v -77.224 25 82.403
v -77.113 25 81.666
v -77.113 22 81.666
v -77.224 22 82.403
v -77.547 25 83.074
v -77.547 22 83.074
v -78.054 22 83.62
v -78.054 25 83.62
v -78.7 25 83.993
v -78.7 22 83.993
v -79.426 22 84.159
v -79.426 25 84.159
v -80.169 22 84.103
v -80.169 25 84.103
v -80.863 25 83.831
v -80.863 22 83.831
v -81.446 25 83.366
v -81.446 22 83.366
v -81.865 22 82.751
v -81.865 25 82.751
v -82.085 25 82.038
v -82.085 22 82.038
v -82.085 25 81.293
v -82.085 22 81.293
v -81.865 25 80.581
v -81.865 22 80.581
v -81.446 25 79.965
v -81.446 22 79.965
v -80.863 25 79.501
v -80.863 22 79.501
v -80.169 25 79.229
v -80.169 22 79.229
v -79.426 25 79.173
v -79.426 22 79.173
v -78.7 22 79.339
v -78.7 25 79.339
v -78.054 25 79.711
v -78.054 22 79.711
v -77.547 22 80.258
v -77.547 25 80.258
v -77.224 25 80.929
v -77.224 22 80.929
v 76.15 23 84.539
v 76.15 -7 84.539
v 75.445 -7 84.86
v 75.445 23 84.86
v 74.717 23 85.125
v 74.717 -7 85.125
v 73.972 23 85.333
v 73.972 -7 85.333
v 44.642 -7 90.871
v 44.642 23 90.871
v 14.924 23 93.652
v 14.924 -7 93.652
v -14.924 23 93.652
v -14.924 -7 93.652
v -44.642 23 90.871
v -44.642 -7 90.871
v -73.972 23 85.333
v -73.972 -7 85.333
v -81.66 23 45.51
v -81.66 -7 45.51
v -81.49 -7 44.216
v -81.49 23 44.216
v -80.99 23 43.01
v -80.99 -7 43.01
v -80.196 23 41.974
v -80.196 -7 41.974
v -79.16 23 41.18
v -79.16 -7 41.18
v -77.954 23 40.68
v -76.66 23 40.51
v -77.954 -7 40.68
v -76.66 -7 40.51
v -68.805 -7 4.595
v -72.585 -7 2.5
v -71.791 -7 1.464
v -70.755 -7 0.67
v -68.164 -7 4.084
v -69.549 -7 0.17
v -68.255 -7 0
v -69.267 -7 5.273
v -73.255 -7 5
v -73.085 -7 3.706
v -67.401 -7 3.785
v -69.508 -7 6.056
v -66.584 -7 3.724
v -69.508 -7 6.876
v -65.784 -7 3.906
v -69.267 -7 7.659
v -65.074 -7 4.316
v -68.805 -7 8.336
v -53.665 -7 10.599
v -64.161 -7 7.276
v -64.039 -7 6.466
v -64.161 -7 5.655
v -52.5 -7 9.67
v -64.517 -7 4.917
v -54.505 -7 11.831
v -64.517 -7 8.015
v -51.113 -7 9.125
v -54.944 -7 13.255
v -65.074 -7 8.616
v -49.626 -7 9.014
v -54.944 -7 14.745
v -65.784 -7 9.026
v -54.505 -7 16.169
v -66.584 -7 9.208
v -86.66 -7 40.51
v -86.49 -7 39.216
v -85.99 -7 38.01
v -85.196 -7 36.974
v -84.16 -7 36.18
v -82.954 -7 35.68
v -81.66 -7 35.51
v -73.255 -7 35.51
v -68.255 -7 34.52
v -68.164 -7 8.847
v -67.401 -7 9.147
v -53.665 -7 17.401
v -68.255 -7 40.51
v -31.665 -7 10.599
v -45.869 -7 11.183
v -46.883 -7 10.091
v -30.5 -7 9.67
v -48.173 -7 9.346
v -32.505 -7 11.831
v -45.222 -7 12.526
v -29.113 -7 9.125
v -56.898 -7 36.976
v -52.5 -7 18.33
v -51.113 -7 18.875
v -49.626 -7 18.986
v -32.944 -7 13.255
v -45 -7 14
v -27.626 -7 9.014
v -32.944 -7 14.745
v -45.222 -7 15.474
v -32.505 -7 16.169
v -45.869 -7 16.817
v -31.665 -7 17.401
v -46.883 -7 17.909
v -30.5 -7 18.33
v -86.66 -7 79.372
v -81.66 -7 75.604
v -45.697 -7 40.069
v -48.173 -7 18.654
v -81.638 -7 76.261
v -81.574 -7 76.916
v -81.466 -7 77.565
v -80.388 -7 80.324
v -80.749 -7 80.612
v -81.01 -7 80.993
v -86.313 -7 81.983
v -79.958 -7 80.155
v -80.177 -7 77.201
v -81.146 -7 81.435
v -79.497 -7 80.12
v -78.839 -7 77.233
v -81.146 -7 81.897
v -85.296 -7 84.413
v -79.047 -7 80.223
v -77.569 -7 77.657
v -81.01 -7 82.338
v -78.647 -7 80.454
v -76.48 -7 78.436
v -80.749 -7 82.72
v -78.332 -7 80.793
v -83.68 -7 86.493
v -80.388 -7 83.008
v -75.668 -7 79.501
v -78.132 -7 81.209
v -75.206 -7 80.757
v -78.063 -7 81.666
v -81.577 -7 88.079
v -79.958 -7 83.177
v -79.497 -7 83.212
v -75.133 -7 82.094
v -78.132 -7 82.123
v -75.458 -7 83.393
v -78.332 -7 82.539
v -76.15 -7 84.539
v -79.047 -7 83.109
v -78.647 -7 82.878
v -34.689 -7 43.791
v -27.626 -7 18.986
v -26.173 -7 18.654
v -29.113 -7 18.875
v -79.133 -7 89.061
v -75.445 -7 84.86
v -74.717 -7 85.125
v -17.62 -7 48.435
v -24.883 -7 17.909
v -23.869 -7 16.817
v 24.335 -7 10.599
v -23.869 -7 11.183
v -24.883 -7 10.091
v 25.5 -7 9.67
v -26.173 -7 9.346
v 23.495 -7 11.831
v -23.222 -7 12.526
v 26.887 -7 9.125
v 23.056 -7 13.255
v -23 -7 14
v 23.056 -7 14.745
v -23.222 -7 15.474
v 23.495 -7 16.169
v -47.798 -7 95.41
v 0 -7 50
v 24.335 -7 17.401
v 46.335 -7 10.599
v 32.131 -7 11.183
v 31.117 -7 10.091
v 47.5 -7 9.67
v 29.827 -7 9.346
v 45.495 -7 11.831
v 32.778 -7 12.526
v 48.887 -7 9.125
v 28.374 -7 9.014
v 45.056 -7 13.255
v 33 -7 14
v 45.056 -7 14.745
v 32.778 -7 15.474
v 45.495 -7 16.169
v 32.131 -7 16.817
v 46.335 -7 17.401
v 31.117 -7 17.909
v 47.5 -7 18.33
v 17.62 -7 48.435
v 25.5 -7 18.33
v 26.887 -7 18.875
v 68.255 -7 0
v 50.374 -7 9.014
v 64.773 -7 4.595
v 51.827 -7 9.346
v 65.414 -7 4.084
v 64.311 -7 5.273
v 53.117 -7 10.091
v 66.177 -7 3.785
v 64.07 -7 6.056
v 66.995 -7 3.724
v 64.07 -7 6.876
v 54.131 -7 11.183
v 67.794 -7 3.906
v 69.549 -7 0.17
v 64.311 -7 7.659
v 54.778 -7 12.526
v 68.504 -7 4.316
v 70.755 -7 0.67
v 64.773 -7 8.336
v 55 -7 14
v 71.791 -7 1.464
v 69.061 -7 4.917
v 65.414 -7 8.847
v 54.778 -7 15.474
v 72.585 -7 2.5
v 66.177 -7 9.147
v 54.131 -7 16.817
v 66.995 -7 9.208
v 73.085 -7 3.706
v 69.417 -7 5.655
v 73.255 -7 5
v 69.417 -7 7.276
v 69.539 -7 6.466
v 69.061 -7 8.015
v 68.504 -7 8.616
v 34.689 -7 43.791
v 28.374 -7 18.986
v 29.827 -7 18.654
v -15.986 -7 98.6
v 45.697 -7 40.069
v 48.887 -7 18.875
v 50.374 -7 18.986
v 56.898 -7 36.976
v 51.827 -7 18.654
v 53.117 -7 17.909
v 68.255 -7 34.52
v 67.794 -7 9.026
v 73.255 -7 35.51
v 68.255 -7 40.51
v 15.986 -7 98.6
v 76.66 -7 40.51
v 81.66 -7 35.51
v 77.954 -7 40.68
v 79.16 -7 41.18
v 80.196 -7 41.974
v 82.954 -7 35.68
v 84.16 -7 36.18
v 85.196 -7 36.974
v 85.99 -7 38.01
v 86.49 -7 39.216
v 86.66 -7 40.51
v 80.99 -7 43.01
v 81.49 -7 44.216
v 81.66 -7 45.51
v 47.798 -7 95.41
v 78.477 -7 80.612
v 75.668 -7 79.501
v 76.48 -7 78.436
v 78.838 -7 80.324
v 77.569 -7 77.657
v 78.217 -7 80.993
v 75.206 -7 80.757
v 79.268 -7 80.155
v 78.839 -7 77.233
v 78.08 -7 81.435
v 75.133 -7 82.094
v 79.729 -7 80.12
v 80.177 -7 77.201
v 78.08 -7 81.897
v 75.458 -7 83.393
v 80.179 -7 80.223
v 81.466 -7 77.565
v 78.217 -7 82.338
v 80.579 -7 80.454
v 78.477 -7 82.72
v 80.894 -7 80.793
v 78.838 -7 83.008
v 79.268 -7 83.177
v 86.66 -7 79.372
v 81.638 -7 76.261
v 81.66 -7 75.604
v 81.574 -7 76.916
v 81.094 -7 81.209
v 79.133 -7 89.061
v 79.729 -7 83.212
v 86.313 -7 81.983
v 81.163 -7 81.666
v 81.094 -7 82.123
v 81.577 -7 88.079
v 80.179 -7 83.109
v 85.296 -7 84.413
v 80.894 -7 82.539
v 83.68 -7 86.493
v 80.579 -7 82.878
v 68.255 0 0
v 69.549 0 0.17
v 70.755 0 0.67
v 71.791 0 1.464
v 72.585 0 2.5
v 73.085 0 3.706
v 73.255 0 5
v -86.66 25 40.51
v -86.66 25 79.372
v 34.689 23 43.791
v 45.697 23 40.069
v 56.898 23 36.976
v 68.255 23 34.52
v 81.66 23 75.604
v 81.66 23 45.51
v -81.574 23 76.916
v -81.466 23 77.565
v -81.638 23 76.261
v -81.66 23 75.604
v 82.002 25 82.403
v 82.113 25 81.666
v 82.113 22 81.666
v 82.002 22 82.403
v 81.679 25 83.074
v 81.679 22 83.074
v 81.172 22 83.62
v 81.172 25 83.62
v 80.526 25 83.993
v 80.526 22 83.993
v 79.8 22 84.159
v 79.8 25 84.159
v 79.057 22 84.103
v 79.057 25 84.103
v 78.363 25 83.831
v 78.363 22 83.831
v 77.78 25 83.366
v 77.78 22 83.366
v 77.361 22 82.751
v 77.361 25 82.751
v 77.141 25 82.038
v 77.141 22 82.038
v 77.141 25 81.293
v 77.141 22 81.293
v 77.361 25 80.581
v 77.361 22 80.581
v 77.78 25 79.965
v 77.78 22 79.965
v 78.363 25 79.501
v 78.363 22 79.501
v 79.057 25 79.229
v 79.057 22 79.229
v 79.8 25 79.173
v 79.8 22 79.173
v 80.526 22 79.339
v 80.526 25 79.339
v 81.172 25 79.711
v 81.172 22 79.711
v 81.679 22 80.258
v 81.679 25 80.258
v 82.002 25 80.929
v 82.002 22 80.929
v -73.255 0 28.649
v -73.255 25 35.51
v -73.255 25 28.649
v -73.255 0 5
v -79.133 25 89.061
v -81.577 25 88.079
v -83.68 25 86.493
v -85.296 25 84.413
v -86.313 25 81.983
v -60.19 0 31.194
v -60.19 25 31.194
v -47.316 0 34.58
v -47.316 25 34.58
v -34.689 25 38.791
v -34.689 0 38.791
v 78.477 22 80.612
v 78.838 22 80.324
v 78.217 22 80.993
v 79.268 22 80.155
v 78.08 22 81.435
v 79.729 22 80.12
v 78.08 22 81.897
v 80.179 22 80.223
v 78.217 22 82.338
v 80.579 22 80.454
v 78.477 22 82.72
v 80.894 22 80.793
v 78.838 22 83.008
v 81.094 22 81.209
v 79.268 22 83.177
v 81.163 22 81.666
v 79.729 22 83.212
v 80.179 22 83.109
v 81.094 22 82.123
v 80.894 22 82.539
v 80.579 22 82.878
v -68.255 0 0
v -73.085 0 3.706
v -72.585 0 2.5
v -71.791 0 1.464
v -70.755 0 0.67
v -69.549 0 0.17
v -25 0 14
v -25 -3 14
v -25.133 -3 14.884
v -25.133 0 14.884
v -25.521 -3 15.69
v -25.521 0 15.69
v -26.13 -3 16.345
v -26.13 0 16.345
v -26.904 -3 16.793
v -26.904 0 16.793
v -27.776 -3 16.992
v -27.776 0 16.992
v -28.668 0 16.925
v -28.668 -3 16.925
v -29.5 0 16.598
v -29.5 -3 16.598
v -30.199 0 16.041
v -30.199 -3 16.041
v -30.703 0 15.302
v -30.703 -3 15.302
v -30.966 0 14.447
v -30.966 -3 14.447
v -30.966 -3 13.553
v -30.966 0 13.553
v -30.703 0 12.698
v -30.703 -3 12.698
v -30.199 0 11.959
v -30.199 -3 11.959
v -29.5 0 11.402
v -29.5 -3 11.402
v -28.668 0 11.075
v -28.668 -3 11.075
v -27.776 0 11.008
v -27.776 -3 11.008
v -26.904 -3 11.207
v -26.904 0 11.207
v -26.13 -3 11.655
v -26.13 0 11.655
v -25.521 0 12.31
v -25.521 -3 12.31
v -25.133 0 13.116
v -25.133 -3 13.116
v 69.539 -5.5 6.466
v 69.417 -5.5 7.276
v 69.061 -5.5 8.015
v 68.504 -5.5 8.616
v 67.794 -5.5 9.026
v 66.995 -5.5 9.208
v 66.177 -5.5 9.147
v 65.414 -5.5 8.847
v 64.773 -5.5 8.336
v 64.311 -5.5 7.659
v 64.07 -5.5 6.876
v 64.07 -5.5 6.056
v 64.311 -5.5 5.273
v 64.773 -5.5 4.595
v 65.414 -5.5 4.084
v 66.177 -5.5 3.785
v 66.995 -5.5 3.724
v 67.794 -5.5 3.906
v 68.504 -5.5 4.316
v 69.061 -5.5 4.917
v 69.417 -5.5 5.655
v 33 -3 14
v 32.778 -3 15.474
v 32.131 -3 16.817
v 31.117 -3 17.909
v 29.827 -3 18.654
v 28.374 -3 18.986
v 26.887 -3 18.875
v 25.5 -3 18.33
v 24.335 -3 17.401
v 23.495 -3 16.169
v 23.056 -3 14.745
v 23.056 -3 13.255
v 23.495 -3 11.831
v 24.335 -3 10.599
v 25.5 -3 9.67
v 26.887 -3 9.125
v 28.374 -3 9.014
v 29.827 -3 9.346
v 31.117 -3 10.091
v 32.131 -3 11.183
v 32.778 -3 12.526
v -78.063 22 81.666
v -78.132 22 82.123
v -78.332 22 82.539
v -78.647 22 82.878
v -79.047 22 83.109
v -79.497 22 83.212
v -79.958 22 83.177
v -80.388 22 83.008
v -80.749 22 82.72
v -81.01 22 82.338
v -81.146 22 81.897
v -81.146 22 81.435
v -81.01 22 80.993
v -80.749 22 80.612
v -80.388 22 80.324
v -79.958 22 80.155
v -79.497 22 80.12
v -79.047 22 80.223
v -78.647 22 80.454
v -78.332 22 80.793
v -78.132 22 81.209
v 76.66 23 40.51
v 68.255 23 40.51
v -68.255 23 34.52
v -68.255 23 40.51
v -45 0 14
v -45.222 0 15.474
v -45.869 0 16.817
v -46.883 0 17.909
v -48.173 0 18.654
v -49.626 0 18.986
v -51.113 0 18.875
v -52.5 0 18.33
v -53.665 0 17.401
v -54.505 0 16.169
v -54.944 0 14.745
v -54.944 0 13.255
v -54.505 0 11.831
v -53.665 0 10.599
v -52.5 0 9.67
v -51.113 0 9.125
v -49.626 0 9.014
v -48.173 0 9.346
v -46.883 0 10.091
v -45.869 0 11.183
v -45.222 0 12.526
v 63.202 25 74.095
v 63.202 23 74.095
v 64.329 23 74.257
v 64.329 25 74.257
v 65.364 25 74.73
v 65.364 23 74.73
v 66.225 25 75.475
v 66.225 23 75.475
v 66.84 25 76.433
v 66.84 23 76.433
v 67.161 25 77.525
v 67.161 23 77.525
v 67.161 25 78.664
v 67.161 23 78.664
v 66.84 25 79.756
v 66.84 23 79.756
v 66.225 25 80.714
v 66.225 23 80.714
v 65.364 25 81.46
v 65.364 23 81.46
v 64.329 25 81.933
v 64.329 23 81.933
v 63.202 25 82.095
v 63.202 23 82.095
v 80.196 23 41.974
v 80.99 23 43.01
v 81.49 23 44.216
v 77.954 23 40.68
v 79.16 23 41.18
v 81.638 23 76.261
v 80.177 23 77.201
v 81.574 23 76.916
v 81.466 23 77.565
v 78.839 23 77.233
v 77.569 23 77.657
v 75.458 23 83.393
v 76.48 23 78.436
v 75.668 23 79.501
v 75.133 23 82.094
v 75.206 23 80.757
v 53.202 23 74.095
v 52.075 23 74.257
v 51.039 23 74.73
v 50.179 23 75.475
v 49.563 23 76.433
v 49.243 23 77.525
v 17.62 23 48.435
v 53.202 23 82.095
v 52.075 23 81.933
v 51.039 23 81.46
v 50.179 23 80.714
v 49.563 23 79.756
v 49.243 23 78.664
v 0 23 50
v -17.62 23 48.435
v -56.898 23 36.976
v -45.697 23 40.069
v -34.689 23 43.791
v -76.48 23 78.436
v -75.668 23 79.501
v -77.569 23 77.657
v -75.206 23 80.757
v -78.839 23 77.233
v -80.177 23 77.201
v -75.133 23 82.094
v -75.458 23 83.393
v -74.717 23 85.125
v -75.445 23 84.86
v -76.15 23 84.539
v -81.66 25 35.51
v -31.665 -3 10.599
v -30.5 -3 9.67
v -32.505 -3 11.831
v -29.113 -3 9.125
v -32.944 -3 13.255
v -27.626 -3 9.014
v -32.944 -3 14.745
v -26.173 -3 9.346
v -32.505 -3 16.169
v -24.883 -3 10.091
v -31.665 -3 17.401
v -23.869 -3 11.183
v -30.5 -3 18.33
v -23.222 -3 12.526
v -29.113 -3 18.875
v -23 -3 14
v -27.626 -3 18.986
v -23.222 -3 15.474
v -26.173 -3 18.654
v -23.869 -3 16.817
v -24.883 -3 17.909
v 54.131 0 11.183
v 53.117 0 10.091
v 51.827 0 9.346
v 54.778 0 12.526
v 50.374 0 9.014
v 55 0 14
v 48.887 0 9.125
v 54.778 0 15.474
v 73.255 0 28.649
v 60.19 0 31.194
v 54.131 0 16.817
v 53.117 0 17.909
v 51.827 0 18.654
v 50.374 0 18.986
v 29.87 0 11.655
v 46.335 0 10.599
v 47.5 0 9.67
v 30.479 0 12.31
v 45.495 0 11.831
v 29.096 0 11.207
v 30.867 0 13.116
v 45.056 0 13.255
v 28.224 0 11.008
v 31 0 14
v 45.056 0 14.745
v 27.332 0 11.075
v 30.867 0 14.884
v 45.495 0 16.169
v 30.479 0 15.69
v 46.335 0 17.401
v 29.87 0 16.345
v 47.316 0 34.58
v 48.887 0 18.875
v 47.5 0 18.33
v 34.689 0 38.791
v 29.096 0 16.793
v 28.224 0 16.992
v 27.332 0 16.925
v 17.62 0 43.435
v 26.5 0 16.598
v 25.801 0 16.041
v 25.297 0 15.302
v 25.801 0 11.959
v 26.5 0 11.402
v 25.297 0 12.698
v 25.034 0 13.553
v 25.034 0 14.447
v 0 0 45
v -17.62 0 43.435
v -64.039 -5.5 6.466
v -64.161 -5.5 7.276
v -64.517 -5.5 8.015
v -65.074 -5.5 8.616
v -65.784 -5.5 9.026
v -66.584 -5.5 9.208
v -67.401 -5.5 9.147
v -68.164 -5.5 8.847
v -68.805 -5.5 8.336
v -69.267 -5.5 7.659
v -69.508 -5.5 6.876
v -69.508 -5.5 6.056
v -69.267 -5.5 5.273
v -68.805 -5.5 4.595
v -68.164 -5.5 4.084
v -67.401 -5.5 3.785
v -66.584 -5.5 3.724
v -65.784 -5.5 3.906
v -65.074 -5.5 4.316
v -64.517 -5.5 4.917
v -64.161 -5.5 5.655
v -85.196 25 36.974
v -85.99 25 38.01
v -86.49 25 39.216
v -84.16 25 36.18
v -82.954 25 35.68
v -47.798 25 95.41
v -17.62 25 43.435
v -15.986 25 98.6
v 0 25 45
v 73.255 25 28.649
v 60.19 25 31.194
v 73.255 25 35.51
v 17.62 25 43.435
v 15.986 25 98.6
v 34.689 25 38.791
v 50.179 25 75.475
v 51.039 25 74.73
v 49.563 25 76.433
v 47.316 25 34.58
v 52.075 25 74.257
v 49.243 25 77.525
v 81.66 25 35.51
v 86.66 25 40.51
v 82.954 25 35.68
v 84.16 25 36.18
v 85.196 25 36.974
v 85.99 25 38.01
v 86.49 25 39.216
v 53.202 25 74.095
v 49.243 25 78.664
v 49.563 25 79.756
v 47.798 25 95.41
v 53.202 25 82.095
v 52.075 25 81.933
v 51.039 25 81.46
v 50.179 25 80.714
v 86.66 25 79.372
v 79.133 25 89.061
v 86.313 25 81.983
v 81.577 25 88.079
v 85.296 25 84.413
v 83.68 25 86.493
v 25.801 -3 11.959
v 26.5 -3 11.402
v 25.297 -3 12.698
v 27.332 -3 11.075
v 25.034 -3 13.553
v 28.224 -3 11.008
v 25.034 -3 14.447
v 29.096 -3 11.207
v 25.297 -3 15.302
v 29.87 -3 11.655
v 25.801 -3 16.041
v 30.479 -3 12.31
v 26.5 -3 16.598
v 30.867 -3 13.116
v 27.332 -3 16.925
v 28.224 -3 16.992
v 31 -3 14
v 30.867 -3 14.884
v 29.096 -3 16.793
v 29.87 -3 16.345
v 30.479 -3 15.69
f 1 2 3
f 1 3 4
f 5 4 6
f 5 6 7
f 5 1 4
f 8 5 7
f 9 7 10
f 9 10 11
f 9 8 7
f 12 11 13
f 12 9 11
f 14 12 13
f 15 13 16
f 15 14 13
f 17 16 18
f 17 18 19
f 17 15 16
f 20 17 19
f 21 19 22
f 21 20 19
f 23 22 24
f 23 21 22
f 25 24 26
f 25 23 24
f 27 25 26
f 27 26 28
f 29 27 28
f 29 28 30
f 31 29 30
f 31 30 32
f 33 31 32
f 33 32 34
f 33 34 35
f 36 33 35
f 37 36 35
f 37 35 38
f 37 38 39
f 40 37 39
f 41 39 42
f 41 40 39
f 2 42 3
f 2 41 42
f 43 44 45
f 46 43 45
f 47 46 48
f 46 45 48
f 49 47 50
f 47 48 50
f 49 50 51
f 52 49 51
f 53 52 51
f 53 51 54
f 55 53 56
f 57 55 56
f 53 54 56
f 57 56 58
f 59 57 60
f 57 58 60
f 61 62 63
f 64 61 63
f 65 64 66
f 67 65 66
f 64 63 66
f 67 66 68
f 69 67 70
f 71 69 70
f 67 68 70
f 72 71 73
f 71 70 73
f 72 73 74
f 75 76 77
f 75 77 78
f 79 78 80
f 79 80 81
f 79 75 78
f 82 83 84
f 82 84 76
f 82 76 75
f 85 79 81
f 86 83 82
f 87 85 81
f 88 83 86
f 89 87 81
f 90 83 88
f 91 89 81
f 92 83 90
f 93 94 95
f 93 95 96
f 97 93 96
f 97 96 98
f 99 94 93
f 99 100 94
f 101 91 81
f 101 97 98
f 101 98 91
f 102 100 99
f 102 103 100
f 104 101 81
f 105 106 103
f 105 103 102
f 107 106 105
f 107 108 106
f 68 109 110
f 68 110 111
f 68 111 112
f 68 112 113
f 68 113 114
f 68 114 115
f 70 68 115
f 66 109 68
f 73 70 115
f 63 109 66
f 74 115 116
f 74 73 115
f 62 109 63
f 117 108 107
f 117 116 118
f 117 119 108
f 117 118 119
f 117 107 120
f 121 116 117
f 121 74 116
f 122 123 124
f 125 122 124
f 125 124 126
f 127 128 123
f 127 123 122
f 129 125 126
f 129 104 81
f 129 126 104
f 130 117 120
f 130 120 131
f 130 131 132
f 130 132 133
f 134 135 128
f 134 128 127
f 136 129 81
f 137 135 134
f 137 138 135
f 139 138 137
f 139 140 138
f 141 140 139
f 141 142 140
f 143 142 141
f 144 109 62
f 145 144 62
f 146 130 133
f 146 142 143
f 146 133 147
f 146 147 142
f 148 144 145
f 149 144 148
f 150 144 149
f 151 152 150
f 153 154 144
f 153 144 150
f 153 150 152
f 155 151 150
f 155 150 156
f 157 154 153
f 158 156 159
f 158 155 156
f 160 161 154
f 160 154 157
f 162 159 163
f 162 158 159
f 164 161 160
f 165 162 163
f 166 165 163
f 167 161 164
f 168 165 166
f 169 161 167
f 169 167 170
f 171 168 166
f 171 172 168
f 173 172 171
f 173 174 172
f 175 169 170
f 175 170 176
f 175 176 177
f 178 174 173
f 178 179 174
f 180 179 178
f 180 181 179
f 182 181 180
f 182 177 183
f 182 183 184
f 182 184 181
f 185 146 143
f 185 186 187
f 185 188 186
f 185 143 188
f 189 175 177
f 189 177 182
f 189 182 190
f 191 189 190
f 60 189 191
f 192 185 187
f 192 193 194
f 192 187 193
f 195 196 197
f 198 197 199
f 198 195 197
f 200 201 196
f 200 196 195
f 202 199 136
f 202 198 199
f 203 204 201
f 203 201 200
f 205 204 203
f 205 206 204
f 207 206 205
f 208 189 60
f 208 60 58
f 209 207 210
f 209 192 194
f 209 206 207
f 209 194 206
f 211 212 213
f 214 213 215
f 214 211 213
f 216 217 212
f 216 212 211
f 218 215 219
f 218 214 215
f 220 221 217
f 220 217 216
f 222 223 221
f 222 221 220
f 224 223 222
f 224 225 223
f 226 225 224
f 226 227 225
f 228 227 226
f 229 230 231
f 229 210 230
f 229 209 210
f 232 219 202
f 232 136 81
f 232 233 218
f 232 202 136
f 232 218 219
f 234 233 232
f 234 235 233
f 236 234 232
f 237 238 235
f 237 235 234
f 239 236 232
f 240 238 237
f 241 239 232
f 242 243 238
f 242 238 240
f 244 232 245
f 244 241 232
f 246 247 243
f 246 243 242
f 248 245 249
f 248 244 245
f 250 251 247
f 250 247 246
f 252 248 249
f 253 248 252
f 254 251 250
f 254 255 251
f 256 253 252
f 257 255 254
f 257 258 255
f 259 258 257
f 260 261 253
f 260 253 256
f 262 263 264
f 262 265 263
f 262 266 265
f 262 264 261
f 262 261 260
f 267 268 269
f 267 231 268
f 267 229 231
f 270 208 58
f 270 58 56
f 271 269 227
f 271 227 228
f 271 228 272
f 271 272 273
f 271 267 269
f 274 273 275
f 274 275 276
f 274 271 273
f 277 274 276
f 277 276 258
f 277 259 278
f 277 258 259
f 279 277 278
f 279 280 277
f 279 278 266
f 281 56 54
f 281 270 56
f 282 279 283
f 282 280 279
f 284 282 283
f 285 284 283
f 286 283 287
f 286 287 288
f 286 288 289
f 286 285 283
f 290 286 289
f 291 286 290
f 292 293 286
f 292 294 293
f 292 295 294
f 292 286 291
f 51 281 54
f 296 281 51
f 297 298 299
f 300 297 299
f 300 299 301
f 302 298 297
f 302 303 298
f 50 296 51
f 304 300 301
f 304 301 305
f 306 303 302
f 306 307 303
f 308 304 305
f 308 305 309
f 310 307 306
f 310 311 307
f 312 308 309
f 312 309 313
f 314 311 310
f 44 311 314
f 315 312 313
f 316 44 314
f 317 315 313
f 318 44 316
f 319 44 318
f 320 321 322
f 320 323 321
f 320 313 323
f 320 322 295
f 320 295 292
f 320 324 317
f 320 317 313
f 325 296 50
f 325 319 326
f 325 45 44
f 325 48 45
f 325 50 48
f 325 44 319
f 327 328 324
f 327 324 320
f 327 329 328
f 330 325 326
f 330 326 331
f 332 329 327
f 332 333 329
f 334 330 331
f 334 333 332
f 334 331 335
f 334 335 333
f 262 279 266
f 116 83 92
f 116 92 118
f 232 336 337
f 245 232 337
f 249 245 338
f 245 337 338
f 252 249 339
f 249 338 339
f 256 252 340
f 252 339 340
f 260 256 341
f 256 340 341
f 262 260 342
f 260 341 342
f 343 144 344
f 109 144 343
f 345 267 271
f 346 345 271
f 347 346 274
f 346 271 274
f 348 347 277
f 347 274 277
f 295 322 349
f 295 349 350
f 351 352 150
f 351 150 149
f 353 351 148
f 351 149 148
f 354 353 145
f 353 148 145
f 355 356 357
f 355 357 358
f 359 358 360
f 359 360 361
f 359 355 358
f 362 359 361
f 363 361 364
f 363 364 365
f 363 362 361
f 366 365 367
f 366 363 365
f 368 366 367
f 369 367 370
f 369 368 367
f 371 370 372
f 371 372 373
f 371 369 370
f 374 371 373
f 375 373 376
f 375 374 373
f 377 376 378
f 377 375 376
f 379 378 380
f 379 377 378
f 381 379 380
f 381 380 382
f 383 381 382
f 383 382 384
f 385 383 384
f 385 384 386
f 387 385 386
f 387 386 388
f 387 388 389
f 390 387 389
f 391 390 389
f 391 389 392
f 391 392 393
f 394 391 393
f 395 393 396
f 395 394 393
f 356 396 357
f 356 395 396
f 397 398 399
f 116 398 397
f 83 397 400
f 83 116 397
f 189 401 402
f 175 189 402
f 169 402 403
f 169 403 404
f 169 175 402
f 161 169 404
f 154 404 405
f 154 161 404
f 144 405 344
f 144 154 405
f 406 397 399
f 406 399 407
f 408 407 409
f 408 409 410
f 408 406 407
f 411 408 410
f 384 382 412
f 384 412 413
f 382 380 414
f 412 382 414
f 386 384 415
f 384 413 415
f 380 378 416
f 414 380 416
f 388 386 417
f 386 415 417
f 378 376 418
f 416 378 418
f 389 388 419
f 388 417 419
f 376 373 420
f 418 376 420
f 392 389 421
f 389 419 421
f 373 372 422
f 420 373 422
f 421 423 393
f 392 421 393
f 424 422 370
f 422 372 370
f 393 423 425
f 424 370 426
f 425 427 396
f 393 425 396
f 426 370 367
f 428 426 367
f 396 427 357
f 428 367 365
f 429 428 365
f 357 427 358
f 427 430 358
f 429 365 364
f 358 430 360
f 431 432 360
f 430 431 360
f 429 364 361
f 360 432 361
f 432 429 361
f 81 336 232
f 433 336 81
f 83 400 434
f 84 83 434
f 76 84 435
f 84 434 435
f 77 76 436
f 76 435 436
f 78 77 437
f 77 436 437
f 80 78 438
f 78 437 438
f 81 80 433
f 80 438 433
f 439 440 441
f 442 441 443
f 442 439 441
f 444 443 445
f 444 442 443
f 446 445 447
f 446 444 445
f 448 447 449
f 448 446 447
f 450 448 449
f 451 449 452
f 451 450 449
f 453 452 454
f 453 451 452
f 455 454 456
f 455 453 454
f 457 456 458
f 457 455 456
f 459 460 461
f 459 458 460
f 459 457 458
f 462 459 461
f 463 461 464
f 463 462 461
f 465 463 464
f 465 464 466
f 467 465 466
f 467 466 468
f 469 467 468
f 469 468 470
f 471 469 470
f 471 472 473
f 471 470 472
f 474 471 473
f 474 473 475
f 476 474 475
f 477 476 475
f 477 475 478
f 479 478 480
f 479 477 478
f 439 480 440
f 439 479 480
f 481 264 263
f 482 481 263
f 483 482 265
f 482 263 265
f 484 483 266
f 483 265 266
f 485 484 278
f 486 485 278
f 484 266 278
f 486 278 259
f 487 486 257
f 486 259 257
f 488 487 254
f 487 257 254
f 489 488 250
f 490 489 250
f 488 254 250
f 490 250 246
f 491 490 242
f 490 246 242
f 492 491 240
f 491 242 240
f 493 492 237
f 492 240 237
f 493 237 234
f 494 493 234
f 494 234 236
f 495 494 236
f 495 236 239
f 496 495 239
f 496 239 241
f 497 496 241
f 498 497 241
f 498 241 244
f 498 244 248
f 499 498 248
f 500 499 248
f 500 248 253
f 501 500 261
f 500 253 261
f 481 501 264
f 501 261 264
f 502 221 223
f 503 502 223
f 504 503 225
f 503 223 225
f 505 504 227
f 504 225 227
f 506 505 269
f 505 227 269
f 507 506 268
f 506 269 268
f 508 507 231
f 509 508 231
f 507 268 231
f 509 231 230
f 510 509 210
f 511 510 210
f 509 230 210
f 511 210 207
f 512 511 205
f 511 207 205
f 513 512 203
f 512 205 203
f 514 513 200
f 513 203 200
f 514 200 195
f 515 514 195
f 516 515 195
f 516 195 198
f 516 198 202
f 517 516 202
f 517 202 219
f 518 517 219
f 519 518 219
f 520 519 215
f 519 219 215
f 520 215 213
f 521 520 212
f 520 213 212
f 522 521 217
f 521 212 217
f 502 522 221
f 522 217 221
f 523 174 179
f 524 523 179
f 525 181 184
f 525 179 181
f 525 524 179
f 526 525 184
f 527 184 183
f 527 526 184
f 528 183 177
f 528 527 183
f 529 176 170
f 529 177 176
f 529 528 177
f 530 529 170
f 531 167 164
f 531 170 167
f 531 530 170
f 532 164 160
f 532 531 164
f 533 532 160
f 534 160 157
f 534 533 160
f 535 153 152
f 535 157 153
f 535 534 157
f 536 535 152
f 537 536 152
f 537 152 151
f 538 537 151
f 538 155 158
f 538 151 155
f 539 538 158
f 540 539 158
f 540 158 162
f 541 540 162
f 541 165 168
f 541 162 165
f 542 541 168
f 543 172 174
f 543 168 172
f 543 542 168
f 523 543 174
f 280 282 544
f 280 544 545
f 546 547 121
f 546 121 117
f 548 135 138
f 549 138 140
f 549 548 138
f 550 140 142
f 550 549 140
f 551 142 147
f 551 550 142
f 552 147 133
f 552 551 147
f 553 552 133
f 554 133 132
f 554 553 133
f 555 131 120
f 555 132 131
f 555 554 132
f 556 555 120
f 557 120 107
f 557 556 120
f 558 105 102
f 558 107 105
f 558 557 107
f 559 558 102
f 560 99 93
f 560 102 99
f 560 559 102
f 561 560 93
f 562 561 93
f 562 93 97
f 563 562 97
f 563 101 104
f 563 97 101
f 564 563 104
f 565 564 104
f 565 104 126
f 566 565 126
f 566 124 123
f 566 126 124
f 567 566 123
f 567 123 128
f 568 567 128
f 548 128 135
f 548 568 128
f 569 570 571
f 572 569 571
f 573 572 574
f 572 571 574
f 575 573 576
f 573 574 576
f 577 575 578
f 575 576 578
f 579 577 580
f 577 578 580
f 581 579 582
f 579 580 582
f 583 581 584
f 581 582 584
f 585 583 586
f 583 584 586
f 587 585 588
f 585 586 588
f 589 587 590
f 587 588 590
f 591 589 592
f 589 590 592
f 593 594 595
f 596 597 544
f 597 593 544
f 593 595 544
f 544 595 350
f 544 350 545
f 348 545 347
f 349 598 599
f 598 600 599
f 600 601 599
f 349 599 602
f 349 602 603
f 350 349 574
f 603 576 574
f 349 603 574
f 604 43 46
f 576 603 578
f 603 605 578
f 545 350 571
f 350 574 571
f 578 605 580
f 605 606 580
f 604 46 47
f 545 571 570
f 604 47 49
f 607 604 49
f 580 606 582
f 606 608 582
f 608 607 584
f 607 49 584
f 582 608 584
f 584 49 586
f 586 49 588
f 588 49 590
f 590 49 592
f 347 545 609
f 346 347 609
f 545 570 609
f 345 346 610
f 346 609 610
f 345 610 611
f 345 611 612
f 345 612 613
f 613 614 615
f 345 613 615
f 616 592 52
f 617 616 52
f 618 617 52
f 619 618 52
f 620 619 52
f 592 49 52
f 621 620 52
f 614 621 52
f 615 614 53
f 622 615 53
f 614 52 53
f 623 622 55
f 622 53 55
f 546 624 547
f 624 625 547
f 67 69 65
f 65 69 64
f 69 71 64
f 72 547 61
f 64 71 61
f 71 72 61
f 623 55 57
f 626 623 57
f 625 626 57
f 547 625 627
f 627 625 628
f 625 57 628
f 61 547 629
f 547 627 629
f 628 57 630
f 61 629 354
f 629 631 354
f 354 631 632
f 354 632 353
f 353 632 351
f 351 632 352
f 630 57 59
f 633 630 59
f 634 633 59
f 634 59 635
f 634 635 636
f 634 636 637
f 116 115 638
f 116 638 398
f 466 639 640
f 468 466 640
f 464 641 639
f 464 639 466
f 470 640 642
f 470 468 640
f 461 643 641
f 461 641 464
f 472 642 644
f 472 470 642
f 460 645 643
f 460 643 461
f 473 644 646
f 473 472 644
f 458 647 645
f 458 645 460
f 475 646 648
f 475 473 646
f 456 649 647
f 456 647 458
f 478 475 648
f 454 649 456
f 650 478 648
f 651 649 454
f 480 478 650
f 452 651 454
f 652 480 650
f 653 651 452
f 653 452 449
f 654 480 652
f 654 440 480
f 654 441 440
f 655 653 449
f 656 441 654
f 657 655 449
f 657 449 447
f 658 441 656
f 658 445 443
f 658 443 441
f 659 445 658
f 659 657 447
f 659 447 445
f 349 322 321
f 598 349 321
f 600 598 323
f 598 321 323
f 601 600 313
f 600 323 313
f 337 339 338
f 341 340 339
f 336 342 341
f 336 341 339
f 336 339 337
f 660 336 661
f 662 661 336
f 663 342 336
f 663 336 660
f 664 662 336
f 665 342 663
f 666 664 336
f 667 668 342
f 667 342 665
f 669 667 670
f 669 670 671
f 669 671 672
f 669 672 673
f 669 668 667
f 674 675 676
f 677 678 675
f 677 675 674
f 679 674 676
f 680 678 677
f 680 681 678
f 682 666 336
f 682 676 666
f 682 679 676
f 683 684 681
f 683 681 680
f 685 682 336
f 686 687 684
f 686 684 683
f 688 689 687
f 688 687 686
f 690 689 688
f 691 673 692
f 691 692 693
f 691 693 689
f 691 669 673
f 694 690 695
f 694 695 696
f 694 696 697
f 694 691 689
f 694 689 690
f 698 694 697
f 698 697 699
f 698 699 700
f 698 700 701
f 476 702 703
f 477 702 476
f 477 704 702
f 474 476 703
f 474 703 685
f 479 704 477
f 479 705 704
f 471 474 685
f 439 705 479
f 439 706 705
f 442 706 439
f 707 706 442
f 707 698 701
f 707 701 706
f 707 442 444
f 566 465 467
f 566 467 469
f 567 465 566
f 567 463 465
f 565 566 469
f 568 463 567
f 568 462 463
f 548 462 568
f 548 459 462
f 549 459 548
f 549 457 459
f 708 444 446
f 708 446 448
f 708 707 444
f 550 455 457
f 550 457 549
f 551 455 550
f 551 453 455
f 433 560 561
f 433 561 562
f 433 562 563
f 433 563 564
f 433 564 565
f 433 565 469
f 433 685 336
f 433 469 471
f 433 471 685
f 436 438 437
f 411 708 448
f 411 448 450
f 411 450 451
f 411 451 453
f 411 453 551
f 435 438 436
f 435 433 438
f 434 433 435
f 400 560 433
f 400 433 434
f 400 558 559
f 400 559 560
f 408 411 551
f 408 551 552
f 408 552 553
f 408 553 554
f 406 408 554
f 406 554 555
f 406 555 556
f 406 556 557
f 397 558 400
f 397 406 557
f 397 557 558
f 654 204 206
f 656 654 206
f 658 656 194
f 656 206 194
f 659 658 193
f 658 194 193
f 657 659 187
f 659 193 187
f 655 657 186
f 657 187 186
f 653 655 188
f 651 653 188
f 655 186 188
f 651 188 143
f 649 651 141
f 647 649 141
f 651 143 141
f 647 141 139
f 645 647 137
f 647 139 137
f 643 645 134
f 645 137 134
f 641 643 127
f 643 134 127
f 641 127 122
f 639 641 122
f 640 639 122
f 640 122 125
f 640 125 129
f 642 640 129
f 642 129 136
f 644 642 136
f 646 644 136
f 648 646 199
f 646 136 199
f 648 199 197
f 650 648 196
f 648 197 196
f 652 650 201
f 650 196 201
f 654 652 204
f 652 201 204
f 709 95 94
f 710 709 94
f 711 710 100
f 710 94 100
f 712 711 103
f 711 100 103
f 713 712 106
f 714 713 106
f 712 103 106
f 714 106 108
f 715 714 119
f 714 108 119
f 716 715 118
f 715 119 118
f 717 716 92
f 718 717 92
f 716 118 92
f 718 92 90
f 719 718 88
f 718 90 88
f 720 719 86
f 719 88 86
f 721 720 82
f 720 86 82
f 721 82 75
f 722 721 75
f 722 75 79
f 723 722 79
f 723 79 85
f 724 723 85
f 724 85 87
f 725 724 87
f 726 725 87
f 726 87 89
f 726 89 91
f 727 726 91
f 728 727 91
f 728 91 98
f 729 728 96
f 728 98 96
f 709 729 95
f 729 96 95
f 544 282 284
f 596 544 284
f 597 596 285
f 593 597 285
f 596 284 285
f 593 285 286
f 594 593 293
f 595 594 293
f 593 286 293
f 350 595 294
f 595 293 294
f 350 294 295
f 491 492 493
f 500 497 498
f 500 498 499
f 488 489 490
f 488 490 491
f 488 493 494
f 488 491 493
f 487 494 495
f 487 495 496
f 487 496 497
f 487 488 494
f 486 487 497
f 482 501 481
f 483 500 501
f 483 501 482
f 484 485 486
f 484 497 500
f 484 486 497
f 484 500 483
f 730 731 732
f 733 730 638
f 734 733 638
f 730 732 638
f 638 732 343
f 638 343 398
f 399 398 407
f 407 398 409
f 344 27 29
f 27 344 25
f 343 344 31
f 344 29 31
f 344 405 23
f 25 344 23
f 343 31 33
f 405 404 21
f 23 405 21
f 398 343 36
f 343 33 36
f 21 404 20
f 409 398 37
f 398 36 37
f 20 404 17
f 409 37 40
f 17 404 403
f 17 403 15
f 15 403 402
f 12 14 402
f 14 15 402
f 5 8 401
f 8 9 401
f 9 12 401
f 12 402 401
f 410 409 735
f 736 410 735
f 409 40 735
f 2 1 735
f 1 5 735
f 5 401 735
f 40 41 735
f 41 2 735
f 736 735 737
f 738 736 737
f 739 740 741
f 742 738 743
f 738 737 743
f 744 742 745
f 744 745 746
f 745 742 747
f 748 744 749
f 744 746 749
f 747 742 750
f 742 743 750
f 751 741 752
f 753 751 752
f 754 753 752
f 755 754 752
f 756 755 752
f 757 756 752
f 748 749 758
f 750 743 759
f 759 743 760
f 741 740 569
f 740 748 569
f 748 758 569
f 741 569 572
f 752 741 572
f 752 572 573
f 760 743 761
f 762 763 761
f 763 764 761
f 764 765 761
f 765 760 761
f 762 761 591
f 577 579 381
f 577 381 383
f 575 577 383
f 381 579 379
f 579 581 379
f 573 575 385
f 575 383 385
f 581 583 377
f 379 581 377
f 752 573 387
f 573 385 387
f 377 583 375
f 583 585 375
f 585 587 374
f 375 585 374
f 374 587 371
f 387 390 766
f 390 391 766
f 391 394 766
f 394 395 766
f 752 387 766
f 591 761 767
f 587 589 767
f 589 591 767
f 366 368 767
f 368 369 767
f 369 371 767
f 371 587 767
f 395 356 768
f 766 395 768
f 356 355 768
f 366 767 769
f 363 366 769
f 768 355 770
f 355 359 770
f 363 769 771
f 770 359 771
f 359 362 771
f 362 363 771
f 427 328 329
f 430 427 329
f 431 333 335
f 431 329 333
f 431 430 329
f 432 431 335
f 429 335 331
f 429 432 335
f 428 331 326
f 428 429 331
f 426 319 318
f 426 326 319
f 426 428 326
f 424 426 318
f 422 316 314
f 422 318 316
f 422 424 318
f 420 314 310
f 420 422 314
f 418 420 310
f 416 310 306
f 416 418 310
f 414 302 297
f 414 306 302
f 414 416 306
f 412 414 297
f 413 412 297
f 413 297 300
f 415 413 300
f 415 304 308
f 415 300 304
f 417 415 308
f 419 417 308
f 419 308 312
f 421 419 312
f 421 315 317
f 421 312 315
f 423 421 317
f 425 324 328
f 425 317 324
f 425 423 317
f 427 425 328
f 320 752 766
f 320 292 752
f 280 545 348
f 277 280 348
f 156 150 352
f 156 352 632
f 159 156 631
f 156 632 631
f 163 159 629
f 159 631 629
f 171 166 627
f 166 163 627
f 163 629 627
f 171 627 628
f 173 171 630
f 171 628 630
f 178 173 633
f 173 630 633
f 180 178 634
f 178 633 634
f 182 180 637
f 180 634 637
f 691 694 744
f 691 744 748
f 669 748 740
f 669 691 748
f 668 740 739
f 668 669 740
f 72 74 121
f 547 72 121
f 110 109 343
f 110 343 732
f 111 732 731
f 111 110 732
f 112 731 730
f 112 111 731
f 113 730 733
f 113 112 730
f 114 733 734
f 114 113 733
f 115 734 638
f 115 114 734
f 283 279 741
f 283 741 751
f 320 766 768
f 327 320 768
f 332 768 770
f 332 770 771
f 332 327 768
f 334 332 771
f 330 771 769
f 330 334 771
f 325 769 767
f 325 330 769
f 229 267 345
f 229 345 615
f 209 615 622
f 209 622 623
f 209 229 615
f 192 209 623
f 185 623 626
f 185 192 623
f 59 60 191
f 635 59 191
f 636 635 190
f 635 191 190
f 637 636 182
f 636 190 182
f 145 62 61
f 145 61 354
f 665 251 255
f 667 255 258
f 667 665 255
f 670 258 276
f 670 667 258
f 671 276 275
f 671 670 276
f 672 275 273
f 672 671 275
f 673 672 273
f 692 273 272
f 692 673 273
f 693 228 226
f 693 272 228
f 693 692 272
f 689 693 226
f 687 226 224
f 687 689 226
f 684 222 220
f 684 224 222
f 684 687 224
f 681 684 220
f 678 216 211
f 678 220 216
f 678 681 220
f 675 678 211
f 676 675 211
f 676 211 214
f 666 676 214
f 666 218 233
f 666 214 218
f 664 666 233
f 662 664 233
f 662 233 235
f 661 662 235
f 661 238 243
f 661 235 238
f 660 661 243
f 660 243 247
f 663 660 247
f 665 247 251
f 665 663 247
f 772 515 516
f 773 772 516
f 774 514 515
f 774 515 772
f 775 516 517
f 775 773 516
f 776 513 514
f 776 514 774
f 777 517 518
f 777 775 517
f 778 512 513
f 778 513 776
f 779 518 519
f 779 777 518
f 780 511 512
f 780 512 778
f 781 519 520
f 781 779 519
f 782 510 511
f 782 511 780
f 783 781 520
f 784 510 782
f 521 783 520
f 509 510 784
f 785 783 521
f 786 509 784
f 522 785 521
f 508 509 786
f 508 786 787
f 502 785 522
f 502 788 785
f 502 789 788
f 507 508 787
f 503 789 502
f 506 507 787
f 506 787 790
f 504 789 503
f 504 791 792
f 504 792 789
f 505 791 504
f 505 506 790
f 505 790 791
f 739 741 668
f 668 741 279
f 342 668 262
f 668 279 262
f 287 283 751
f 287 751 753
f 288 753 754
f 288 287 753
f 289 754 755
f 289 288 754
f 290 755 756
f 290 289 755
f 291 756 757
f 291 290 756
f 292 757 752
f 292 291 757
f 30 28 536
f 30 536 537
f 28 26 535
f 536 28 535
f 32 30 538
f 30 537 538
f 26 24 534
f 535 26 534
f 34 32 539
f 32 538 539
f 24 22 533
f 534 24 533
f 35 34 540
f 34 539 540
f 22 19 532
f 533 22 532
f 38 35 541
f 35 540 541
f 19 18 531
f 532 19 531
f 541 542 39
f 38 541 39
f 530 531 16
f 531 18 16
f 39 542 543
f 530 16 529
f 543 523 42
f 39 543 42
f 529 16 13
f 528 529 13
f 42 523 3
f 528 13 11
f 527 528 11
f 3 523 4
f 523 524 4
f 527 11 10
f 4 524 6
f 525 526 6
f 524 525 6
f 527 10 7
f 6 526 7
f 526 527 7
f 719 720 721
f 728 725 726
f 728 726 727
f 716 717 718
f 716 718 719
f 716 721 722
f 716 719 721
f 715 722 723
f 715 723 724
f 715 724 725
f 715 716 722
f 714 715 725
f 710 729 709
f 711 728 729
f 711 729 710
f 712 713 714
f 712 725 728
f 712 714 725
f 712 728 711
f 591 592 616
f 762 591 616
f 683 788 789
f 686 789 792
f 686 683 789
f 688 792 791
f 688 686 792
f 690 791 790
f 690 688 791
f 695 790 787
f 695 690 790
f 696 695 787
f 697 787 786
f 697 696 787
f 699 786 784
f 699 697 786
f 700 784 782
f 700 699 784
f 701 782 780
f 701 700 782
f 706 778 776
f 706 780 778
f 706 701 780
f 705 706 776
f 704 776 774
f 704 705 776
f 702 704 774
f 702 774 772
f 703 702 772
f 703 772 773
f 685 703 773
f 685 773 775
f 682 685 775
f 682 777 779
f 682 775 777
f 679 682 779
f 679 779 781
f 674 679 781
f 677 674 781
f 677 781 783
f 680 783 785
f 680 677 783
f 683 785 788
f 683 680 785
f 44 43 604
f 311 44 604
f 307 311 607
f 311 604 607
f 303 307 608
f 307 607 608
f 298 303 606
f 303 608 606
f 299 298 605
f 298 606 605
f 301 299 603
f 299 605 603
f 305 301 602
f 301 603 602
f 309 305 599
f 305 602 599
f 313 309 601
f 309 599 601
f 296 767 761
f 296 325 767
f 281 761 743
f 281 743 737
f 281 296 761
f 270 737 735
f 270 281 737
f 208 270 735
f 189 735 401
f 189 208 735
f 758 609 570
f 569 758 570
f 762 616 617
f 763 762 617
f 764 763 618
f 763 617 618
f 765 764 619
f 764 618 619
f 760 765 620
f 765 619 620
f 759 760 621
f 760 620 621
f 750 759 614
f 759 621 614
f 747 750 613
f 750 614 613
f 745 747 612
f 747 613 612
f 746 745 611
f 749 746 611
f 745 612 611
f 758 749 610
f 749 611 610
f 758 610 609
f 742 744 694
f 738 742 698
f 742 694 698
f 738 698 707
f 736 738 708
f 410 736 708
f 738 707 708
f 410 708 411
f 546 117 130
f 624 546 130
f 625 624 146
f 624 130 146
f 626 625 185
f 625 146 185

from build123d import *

# Parameters (mm, degrees)
PAD_DEPTH       = 7
PAD012_DEPTH    = 25
SKETCH013_R     = 5
SKETCH013_R_2   = 3
POCKET007_DEPTH = 7.001
POCKET008_DEPTH = 30
SKETCH023_R     = 5
POCKET009_DEPTH = 4
SKETCH024_R     = 4.5
PAD013_DEPTH    = 30
SKETCH028_R     = 2.75
POCKET012_DEPTH = 1.5
SKETCH029_R     = 1.55
POCKET013_DEPTH = 32.001
SKETCH030_R     = 2.5
POCKET014_DEPTH = 3
POCKET015_DEPTH = 25.001


with BuildPart() as part:
    # Sketch011 → Pad (new body)
    with BuildSketch(Plane.XZ):
        with BuildLine():
            Line((73.255, 35.51), (73.255, 5))
            ThreePointArc((68.255, 0), (71.790534, 1.464466), (73.255, 5))
            Line((68.255, 0), (-68.255, 0))
            ThreePointArc((-73.255, 5), (-71.790534, 1.464466), (-68.255, 0))
            Line((-73.255, 5), (-73.255, 35.51))
            Line((-73.255, 35.51), (-81.66, 35.51))
            ThreePointArc((-86.66, 40.51), (-85.195534, 36.974466), (-81.66, 35.51))
            Line((-86.66, 40.51), (-86.66, 79.371844))
            ThreePointArc((-79.132903, 89.061258), (-84.557121, 85.50662), (-86.66, 79.371844))
            ThreePointArc((79.132903, 89.061258), (0, 99), (-79.132903, 89.061258))
            ThreePointArc((86.66, 79.371844), (84.557121, 85.50662), (79.132903, 89.061258))
            Line((86.66, 79.371844), (86.66, 40.51))
            ThreePointArc((81.66, 35.51), (85.195534, 36.974466), (86.66, 40.51))
            Line((81.66, 35.51), (73.255, 35.51))
        make_face()
    extrude(amount=PAD_DEPTH)

    # Sketch012 → Pad012 (join)
    with BuildSketch(Plane.XZ):
        with BuildLine():
            ThreePointArc((79.132903, 89.061258), (0, 99), (-79.132903, 89.061258))
            ThreePointArc((-79.132903, 89.061258), (-84.557121, 85.50662), (-86.66, 79.371844))
            Line((-86.66, 79.371844), (-86.66, 40.51))
            ThreePointArc((-86.66, 40.51), (-85.195534, 36.974466), (-81.66, 35.51))
            Line((-81.66, 35.51), (-73.255, 35.51))
            Line((-73.255, 35.51), (-73.255, 28.649016))
            ThreePointArc((-73.255, 28.649016), (-53.725584, 32.7828), (-34.688969, 38.790593))
            ThreePointArc((34.688969, 38.790593), (0, 45), (-34.688969, 38.790593))
            ThreePointArc((34.688969, 38.790593), (53.725584, 32.7828), (73.255, 28.649016))
            Line((73.255, 35.51), (73.255, 28.649016))
            Line((73.255, 35.51), (81.66, 35.51))
            ThreePointArc((81.66, 35.51), (85.195534, 36.974466), (86.66, 40.51))
            Line((86.66, 40.51), (86.66, 79.371844))
            ThreePointArc((86.66, 79.371844), (84.557121, 85.50662), (79.132903, 89.061258))
        make_face()
    extrude(amount=-PAD012_DEPTH)

    # Sketch013 → Pocket007 (cut, through all)
    with BuildSketch(Plane.XZ):
        with Locations((-50, 14)):
            Circle(SKETCH013_R)
        with Locations((-28, 14)):
            Circle(SKETCH013_R_2)
        with Locations((28, 14)):
            Circle(SKETCH013_R_2)
        with Locations((50, 14)):
            Circle(SKETCH013_R)
    extrude(amount=POCKET007_DEPTH, mode=Mode.SUBTRACT)

    # Sketch015 → Pocket008 (cut)
    with BuildSketch(Plane.XZ.offset(7)):
        with BuildLine():
            Line((81.66, 75.603787), (81.66, 45.51))
            ThreePointArc((76.66, 40.51), (80.195534, 41.974466), (81.66, 45.51))
            Line((76.66, 40.51), (68.255, 40.51))
            Line((68.255, 40.51), (68.255, 34.519539))
            ThreePointArc((34.688969, 43.790593), (51.275394, 38.443308), (68.255, 34.519539))
            ThreePointArc((34.688969, 43.790593), (0, 50), (-34.688969, 43.790593))
            ThreePointArc((-68.255, 34.519539), (-51.275394, 38.443308), (-34.688969, 43.790593))
            Line((-68.255, 40.51), (-68.255, 34.519539))
            Line((-76.66, 40.51), (-68.255, 40.51))
            ThreePointArc((-81.66, 45.51), (-80.195534, 41.974466), (-76.66, 40.51))
            Line((-81.66, 45.51), (-81.66, 75.603787))
            ThreePointArc((-73.971613, 85.332942), (-79.505895, 81.803943), (-81.66, 75.603787))
            ThreePointArc((73.971613, 85.332942), (0, 94), (-73.971613, 85.332942))
            ThreePointArc((81.66, 75.603787), (79.505895, 81.803943), (73.971613, 85.332942))
        make_face()
    extrude(amount=-POCKET008_DEPTH, mode=Mode.SUBTRACT)

    # Sketch023 → Pocket009 (cut)
    with BuildSketch(Plane.XZ.offset(7)):
        with Locations((-28, 14)):
            Circle(SKETCH023_R)
        with Locations((28, 14)):
            Circle(SKETCH023_R)
    extrude(amount=-POCKET009_DEPTH, mode=Mode.SUBTRACT)

    # Sketch024 → Pad013 (join)
    with BuildSketch(Plane.XZ.offset(-23)):
        with Locations((-79.61305, 81.665882)):
            Circle(SKETCH024_R)
        with Locations((79.61305, 81.665882)):
            Circle(SKETCH024_R)
    extrude(amount=PAD013_DEPTH)

    # Sketch028 → Pocket012 (cut)
    with BuildSketch(Plane.XZ.offset(7)):
        with Locations((-66.789089, 6.465911)):
            Circle(SKETCH028_R)
        with Locations((66.789089, 6.465911)):
            Circle(SKETCH028_R)
    extrude(amount=-POCKET012_DEPTH, mode=Mode.SUBTRACT)

    # Sketch029 → Pocket013 (cut, through all)
    with BuildSketch(Plane.XZ.offset(-25)):
        with Locations((-79.61305, 81.665882)):
            Circle(SKETCH029_R)
        with Locations((79.61305, 81.665882)):
            Circle(SKETCH029_R)
    extrude(amount=POCKET013_DEPTH, mode=Mode.SUBTRACT)

    # Sketch030 → Pocket014 (cut)
    with BuildSketch(Plane.XZ.offset(-25)):
        with Locations((-79.61305, 81.665882)):
            Circle(SKETCH030_R)
        with Locations((79.61305, 81.665882)):
            Circle(SKETCH030_R)
    extrude(amount=POCKET014_DEPTH, mode=Mode.SUBTRACT)

    # Sketch031 → Pocket015 (cut, through all)
    with BuildSketch(Plane.XZ):
        with BuildLine():
            ThreePointArc((53.201861, 82.094664), (49.201861, 78.094664), (53.201861, 74.094664))
            Line((53.201861, 74.094664), (63.201861, 74.094664))
            ThreePointArc((63.201861, 74.094664), (67.201861, 78.094664), (63.201861, 82.094664))
            Line((63.201861, 82.094664), (53.201861, 82.094664))
        make_face()
    extrude(amount=-POCKET015_DEPTH, mode=Mode.SUBTRACT)


solid = part.part
